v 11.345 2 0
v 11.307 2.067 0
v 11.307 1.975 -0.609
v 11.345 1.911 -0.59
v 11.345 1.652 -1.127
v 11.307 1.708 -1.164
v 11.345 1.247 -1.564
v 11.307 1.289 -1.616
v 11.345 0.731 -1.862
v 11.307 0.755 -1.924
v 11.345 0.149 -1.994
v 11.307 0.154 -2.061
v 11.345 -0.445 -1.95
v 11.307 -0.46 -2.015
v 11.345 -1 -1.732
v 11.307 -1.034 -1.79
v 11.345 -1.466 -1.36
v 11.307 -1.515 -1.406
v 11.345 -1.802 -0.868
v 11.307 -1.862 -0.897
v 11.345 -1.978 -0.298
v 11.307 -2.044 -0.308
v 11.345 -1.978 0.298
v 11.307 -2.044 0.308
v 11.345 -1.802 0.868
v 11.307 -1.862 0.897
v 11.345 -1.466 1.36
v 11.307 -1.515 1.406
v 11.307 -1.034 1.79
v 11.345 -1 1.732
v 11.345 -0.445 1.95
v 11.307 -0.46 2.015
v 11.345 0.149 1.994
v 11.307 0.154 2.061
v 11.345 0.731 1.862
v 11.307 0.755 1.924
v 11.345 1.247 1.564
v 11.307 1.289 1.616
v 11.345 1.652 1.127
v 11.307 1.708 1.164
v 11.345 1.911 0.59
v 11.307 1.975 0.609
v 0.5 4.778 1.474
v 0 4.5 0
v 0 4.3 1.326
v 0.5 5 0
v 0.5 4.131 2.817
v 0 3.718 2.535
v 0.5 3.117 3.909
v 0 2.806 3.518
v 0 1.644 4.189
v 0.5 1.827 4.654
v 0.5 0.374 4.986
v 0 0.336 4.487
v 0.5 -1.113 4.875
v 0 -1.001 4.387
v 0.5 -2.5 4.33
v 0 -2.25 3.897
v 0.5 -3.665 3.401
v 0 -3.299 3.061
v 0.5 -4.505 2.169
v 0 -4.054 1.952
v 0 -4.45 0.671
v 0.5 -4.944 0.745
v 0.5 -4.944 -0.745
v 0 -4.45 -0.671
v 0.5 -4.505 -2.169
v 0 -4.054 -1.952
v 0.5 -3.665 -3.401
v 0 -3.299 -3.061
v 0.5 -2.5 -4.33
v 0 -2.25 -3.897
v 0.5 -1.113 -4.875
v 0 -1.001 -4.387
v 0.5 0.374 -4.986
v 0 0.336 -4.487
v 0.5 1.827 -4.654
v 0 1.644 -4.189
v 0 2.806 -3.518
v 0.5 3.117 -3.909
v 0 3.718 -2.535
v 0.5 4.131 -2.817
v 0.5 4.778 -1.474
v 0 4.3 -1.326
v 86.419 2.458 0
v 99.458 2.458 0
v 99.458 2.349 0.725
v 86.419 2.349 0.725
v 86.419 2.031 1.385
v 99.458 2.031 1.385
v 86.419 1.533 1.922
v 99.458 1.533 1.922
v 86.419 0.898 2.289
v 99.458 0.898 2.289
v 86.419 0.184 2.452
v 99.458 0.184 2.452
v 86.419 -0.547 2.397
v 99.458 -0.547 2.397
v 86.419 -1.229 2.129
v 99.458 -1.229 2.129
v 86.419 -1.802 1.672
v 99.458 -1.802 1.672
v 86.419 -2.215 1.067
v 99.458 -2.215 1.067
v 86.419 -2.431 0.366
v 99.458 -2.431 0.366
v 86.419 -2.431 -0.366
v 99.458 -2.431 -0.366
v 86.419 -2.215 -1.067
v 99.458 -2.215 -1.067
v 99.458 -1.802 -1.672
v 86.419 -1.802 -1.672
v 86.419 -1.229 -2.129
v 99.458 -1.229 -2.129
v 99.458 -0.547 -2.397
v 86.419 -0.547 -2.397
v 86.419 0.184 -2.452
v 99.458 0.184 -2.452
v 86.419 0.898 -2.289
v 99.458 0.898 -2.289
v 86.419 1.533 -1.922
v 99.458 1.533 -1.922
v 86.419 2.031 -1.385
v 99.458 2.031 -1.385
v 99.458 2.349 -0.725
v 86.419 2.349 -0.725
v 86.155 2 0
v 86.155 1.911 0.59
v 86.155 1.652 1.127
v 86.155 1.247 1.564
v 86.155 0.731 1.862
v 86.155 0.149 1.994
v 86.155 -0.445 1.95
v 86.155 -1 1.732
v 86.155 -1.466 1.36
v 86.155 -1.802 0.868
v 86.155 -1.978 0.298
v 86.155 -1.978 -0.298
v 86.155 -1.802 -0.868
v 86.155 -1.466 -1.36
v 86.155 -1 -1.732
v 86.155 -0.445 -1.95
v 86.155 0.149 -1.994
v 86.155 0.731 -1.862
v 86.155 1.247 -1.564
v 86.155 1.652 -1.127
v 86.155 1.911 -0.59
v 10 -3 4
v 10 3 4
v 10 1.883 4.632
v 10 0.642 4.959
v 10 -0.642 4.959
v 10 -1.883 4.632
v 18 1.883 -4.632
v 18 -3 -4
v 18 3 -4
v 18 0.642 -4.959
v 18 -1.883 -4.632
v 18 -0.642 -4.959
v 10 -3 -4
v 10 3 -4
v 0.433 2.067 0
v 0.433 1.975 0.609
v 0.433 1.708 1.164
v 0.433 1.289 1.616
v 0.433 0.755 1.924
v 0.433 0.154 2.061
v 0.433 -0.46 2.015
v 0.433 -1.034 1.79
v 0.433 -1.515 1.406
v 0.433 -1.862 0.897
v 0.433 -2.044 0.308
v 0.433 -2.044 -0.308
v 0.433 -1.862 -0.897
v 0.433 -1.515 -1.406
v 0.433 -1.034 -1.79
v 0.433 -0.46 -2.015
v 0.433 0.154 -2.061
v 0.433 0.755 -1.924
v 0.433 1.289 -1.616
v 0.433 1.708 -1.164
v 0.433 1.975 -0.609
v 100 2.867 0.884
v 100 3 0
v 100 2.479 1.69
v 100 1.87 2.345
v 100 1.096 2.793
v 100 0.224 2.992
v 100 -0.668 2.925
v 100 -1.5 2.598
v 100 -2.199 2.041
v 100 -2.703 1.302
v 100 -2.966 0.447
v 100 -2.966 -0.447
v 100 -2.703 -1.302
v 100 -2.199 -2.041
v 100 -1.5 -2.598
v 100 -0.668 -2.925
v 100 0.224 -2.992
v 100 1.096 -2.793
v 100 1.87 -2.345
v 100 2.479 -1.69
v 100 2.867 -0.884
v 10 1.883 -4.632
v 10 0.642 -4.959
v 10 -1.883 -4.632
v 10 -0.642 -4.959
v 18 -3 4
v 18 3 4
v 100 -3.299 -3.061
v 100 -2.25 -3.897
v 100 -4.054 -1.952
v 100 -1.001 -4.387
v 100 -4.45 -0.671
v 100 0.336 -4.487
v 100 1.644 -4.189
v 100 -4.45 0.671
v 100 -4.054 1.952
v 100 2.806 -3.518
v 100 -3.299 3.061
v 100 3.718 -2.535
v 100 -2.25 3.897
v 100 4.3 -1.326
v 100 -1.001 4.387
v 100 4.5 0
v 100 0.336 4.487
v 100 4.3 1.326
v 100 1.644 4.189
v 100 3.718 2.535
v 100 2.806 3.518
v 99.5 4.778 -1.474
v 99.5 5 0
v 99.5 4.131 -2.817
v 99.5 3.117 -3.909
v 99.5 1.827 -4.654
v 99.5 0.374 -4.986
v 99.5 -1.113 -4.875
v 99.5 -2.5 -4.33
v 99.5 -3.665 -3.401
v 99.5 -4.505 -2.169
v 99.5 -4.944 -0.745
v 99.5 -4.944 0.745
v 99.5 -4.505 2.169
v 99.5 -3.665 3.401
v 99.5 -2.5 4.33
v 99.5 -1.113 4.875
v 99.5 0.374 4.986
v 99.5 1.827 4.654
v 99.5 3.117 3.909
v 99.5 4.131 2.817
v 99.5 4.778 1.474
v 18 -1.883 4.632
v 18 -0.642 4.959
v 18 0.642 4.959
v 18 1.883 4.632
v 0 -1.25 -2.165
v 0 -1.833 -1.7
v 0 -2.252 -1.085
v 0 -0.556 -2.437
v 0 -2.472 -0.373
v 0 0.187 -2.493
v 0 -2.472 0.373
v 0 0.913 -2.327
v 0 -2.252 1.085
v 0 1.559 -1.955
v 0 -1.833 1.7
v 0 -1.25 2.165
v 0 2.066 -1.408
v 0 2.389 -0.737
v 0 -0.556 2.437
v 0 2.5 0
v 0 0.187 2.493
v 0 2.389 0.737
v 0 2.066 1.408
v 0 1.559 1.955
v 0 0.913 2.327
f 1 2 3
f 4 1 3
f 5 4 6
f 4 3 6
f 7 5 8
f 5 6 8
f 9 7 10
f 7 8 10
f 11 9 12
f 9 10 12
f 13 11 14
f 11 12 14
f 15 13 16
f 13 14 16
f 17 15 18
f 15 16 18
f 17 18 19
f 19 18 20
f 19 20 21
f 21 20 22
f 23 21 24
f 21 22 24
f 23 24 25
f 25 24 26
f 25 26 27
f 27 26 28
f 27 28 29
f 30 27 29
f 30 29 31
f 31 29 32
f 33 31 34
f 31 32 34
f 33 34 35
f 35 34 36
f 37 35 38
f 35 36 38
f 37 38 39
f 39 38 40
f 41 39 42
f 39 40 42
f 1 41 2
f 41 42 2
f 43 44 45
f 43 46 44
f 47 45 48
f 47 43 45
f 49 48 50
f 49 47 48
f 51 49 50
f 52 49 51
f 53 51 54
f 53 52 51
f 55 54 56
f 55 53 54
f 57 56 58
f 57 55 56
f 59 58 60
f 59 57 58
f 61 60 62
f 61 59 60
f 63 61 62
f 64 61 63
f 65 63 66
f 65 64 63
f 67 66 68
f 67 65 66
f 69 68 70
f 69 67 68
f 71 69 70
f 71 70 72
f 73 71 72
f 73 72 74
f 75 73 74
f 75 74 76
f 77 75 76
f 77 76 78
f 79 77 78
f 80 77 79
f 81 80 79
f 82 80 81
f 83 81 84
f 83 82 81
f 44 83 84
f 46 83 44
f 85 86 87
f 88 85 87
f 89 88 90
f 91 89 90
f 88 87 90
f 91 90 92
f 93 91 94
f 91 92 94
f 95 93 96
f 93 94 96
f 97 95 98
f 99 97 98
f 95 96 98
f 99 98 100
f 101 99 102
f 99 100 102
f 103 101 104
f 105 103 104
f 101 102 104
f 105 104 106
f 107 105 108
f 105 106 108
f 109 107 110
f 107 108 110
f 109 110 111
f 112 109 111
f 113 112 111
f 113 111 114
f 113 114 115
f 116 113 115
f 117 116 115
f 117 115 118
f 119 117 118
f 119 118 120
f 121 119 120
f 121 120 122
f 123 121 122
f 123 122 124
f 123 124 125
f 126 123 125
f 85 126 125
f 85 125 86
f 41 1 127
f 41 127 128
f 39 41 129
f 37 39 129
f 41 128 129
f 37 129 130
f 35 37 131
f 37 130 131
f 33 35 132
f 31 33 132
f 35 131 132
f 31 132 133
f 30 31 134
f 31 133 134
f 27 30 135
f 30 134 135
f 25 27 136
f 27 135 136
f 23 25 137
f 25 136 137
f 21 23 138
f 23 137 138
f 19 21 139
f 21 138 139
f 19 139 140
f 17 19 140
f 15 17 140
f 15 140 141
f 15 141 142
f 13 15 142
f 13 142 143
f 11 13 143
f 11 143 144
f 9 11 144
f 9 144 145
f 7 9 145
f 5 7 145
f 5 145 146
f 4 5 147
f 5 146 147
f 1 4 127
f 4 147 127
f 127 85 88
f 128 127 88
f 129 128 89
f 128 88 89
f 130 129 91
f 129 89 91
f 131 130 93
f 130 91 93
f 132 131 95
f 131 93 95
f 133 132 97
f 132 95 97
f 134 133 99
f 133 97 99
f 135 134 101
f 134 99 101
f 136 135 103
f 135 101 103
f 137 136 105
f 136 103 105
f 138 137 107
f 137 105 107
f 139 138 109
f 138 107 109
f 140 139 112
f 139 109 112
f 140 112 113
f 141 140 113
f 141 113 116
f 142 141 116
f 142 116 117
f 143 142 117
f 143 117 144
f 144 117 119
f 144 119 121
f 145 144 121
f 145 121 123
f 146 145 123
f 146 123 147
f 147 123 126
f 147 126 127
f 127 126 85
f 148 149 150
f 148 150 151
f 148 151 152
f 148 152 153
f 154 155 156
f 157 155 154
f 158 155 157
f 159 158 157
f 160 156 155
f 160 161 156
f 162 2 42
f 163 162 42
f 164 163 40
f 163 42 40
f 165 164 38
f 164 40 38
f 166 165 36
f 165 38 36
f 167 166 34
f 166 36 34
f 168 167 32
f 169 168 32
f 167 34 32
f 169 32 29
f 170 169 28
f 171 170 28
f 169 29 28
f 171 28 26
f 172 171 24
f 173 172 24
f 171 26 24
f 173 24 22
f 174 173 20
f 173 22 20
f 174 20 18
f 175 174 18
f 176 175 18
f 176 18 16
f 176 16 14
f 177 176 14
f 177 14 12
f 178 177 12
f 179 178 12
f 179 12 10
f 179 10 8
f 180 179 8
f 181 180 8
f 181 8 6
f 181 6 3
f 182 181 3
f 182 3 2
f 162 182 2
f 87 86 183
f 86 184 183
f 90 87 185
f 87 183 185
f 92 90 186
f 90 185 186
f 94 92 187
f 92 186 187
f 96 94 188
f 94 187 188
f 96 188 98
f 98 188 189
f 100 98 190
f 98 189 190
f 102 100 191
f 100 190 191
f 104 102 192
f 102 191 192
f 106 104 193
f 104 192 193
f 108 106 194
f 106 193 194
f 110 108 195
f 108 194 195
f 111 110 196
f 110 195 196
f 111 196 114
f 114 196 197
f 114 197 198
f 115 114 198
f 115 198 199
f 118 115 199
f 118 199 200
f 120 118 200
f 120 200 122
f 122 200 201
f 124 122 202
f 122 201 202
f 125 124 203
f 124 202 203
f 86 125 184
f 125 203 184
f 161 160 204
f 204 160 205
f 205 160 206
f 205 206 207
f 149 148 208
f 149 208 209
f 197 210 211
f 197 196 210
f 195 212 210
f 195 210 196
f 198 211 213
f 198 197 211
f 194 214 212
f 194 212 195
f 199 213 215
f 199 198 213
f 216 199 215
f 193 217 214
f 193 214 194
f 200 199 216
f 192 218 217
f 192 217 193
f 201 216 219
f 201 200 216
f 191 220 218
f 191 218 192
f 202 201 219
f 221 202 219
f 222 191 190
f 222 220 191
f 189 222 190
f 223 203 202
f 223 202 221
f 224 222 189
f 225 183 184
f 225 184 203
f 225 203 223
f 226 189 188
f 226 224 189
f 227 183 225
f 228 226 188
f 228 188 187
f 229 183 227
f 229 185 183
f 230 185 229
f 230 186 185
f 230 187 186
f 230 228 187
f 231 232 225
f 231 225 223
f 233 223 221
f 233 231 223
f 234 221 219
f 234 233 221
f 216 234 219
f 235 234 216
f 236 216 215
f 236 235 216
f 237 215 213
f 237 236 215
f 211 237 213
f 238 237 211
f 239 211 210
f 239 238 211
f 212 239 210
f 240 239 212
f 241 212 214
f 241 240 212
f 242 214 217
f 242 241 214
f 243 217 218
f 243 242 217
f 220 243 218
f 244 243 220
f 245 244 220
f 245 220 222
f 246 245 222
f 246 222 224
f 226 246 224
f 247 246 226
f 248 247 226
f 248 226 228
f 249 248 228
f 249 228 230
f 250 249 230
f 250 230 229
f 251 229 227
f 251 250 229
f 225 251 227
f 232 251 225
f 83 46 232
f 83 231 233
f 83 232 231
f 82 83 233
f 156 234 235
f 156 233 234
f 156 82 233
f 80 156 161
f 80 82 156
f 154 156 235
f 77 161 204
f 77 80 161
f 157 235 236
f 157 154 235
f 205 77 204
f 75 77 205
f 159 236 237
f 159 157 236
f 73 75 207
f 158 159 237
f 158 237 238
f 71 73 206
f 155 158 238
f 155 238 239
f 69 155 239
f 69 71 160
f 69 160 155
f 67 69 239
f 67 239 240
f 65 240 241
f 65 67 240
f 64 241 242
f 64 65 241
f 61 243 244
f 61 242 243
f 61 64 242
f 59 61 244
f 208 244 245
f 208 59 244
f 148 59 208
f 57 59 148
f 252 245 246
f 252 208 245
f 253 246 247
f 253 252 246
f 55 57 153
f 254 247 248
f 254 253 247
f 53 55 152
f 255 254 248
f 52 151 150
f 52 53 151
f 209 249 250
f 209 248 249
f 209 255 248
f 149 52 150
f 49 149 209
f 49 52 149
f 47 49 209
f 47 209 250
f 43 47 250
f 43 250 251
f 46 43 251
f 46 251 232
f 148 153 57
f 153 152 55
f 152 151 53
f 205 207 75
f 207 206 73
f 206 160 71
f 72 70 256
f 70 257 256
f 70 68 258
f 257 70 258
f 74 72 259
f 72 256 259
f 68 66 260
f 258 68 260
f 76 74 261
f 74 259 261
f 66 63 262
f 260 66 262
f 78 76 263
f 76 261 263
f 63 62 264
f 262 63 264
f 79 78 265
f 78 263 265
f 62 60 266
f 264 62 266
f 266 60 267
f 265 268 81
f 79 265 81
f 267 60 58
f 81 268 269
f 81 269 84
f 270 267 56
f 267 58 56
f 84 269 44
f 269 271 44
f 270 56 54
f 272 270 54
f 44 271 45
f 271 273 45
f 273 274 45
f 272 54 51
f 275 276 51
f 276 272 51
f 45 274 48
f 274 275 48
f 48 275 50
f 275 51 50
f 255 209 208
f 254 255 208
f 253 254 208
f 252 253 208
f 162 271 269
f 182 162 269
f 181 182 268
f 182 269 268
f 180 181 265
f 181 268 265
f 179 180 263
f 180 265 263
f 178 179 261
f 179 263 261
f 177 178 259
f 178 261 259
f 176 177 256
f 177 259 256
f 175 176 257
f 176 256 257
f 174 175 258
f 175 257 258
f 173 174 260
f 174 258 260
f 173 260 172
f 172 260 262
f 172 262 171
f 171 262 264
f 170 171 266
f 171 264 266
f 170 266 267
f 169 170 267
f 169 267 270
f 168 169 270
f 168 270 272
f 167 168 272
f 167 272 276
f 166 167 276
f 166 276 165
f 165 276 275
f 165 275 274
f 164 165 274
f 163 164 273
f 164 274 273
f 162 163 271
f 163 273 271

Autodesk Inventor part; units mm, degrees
ref_plane "YZ Plane" through (0, 0, 0) normal (1, 0, 0) x (0, 1, 0)
ref_plane "XZ Plane" through (0, 0, 0) normal (0, 1, 0) x (-1, 0, 0)
ref_plane "XY Plane" through (0, 0, 0) normal (0, 0, 1) x (1, 0, 0)
sketch "Sketch_1" plane through (0, 0, 0) normal (0, 0, 1) x (1, 0, 0)
  line L0 (100, 0) -> (0, 0)
  line L1 (0, 4.5) -> (0, 2)
  line L2 (0, 2) -> (100, 2)
  line L3 (100, 2) -> (100, 4.5)
  line L4 (100, 4.5) -> (99.5, 5)
  line L5 (99.5, 5) -> (0.5, 5)
  line L6 (0.5, 5) -> (0, 4.5)
revolve "Revolution1" add sketch "Sketch_1" angle 360 about axis through (100, 0, 0) along (1, 0, 0)
sketch "Sketch_6" plane through (0, 0, 0) normal (0, 0, 1) x (1, 0, 0)
  line L0 (12.5, 0) -> (0, 0)
  line L1 (0, 0) -> (0, 2.5)
  line L2 (0, 2.5) -> (0.433, 2.067)
  line L3 (0.433, 2.067) -> (11.3066, 2.067)
  line L4 (11.3066, 2.067) -> (12.5, 0)
  line L5 (12.5, 0) -> (0, 0)
revolve "Revolution2" cut sketch "Sketch_6" angle 360 about axis through (12.5, 0, 0) along (1, 0, 0)
thread "Thread1" size "M5x0.8" class "6H" standard "ISO Metric profile" length 10 offset 1.3066
sketch "Sketch_7" plane through (0, 0, 0) normal (0, 0, 1) x (1, 0, 0)
  line L0 (100, 0) -> (85, 0)
  line L1 (85, 0) -> (86.4194, 2.4585)
  line L2 (86.4194, 2.4585) -> (99.4585, 2.4585)
  line L3 (99.4585, 2.4585) -> (100, 3)
  line L4 (100, 3) -> (100, 0)
  line L5 (100, 0) -> (85, 0)
revolve "Revolution3" cut sketch "Sketch_7" angle 360 about axis through (100, 0, 0) along (1, 0, 0)
thread "Thread2" size "M6x1" class "6H" standard "ISO Metric profile" length 12 offset 1.5806
sketch "Sketch_2" plane through (10, 0, 0) normal (1, 0, 0) x (0, 0, -1)
  line L0 (-6, 7) -> (-6, -5)
  line L1 (-6, -5) -> (-4, -5)
  line L2 (-4, -5) -> (-4, 6)
  line L3 (-4, 6) -> (4, 6)
  line L4 (4, 6) -> (4, -5)
  line L5 (4, -5) -> (6, -5)
  line L6 (6, -5) -> (6, 7)
  line L7 (6, 7) -> (-6, 7)
extrude "Extrusion1" cut sketch "Sketch_2" along normal blind 8
properties part number "PSPWR10-100-M5-N6-SC10" material "MISUMI"
